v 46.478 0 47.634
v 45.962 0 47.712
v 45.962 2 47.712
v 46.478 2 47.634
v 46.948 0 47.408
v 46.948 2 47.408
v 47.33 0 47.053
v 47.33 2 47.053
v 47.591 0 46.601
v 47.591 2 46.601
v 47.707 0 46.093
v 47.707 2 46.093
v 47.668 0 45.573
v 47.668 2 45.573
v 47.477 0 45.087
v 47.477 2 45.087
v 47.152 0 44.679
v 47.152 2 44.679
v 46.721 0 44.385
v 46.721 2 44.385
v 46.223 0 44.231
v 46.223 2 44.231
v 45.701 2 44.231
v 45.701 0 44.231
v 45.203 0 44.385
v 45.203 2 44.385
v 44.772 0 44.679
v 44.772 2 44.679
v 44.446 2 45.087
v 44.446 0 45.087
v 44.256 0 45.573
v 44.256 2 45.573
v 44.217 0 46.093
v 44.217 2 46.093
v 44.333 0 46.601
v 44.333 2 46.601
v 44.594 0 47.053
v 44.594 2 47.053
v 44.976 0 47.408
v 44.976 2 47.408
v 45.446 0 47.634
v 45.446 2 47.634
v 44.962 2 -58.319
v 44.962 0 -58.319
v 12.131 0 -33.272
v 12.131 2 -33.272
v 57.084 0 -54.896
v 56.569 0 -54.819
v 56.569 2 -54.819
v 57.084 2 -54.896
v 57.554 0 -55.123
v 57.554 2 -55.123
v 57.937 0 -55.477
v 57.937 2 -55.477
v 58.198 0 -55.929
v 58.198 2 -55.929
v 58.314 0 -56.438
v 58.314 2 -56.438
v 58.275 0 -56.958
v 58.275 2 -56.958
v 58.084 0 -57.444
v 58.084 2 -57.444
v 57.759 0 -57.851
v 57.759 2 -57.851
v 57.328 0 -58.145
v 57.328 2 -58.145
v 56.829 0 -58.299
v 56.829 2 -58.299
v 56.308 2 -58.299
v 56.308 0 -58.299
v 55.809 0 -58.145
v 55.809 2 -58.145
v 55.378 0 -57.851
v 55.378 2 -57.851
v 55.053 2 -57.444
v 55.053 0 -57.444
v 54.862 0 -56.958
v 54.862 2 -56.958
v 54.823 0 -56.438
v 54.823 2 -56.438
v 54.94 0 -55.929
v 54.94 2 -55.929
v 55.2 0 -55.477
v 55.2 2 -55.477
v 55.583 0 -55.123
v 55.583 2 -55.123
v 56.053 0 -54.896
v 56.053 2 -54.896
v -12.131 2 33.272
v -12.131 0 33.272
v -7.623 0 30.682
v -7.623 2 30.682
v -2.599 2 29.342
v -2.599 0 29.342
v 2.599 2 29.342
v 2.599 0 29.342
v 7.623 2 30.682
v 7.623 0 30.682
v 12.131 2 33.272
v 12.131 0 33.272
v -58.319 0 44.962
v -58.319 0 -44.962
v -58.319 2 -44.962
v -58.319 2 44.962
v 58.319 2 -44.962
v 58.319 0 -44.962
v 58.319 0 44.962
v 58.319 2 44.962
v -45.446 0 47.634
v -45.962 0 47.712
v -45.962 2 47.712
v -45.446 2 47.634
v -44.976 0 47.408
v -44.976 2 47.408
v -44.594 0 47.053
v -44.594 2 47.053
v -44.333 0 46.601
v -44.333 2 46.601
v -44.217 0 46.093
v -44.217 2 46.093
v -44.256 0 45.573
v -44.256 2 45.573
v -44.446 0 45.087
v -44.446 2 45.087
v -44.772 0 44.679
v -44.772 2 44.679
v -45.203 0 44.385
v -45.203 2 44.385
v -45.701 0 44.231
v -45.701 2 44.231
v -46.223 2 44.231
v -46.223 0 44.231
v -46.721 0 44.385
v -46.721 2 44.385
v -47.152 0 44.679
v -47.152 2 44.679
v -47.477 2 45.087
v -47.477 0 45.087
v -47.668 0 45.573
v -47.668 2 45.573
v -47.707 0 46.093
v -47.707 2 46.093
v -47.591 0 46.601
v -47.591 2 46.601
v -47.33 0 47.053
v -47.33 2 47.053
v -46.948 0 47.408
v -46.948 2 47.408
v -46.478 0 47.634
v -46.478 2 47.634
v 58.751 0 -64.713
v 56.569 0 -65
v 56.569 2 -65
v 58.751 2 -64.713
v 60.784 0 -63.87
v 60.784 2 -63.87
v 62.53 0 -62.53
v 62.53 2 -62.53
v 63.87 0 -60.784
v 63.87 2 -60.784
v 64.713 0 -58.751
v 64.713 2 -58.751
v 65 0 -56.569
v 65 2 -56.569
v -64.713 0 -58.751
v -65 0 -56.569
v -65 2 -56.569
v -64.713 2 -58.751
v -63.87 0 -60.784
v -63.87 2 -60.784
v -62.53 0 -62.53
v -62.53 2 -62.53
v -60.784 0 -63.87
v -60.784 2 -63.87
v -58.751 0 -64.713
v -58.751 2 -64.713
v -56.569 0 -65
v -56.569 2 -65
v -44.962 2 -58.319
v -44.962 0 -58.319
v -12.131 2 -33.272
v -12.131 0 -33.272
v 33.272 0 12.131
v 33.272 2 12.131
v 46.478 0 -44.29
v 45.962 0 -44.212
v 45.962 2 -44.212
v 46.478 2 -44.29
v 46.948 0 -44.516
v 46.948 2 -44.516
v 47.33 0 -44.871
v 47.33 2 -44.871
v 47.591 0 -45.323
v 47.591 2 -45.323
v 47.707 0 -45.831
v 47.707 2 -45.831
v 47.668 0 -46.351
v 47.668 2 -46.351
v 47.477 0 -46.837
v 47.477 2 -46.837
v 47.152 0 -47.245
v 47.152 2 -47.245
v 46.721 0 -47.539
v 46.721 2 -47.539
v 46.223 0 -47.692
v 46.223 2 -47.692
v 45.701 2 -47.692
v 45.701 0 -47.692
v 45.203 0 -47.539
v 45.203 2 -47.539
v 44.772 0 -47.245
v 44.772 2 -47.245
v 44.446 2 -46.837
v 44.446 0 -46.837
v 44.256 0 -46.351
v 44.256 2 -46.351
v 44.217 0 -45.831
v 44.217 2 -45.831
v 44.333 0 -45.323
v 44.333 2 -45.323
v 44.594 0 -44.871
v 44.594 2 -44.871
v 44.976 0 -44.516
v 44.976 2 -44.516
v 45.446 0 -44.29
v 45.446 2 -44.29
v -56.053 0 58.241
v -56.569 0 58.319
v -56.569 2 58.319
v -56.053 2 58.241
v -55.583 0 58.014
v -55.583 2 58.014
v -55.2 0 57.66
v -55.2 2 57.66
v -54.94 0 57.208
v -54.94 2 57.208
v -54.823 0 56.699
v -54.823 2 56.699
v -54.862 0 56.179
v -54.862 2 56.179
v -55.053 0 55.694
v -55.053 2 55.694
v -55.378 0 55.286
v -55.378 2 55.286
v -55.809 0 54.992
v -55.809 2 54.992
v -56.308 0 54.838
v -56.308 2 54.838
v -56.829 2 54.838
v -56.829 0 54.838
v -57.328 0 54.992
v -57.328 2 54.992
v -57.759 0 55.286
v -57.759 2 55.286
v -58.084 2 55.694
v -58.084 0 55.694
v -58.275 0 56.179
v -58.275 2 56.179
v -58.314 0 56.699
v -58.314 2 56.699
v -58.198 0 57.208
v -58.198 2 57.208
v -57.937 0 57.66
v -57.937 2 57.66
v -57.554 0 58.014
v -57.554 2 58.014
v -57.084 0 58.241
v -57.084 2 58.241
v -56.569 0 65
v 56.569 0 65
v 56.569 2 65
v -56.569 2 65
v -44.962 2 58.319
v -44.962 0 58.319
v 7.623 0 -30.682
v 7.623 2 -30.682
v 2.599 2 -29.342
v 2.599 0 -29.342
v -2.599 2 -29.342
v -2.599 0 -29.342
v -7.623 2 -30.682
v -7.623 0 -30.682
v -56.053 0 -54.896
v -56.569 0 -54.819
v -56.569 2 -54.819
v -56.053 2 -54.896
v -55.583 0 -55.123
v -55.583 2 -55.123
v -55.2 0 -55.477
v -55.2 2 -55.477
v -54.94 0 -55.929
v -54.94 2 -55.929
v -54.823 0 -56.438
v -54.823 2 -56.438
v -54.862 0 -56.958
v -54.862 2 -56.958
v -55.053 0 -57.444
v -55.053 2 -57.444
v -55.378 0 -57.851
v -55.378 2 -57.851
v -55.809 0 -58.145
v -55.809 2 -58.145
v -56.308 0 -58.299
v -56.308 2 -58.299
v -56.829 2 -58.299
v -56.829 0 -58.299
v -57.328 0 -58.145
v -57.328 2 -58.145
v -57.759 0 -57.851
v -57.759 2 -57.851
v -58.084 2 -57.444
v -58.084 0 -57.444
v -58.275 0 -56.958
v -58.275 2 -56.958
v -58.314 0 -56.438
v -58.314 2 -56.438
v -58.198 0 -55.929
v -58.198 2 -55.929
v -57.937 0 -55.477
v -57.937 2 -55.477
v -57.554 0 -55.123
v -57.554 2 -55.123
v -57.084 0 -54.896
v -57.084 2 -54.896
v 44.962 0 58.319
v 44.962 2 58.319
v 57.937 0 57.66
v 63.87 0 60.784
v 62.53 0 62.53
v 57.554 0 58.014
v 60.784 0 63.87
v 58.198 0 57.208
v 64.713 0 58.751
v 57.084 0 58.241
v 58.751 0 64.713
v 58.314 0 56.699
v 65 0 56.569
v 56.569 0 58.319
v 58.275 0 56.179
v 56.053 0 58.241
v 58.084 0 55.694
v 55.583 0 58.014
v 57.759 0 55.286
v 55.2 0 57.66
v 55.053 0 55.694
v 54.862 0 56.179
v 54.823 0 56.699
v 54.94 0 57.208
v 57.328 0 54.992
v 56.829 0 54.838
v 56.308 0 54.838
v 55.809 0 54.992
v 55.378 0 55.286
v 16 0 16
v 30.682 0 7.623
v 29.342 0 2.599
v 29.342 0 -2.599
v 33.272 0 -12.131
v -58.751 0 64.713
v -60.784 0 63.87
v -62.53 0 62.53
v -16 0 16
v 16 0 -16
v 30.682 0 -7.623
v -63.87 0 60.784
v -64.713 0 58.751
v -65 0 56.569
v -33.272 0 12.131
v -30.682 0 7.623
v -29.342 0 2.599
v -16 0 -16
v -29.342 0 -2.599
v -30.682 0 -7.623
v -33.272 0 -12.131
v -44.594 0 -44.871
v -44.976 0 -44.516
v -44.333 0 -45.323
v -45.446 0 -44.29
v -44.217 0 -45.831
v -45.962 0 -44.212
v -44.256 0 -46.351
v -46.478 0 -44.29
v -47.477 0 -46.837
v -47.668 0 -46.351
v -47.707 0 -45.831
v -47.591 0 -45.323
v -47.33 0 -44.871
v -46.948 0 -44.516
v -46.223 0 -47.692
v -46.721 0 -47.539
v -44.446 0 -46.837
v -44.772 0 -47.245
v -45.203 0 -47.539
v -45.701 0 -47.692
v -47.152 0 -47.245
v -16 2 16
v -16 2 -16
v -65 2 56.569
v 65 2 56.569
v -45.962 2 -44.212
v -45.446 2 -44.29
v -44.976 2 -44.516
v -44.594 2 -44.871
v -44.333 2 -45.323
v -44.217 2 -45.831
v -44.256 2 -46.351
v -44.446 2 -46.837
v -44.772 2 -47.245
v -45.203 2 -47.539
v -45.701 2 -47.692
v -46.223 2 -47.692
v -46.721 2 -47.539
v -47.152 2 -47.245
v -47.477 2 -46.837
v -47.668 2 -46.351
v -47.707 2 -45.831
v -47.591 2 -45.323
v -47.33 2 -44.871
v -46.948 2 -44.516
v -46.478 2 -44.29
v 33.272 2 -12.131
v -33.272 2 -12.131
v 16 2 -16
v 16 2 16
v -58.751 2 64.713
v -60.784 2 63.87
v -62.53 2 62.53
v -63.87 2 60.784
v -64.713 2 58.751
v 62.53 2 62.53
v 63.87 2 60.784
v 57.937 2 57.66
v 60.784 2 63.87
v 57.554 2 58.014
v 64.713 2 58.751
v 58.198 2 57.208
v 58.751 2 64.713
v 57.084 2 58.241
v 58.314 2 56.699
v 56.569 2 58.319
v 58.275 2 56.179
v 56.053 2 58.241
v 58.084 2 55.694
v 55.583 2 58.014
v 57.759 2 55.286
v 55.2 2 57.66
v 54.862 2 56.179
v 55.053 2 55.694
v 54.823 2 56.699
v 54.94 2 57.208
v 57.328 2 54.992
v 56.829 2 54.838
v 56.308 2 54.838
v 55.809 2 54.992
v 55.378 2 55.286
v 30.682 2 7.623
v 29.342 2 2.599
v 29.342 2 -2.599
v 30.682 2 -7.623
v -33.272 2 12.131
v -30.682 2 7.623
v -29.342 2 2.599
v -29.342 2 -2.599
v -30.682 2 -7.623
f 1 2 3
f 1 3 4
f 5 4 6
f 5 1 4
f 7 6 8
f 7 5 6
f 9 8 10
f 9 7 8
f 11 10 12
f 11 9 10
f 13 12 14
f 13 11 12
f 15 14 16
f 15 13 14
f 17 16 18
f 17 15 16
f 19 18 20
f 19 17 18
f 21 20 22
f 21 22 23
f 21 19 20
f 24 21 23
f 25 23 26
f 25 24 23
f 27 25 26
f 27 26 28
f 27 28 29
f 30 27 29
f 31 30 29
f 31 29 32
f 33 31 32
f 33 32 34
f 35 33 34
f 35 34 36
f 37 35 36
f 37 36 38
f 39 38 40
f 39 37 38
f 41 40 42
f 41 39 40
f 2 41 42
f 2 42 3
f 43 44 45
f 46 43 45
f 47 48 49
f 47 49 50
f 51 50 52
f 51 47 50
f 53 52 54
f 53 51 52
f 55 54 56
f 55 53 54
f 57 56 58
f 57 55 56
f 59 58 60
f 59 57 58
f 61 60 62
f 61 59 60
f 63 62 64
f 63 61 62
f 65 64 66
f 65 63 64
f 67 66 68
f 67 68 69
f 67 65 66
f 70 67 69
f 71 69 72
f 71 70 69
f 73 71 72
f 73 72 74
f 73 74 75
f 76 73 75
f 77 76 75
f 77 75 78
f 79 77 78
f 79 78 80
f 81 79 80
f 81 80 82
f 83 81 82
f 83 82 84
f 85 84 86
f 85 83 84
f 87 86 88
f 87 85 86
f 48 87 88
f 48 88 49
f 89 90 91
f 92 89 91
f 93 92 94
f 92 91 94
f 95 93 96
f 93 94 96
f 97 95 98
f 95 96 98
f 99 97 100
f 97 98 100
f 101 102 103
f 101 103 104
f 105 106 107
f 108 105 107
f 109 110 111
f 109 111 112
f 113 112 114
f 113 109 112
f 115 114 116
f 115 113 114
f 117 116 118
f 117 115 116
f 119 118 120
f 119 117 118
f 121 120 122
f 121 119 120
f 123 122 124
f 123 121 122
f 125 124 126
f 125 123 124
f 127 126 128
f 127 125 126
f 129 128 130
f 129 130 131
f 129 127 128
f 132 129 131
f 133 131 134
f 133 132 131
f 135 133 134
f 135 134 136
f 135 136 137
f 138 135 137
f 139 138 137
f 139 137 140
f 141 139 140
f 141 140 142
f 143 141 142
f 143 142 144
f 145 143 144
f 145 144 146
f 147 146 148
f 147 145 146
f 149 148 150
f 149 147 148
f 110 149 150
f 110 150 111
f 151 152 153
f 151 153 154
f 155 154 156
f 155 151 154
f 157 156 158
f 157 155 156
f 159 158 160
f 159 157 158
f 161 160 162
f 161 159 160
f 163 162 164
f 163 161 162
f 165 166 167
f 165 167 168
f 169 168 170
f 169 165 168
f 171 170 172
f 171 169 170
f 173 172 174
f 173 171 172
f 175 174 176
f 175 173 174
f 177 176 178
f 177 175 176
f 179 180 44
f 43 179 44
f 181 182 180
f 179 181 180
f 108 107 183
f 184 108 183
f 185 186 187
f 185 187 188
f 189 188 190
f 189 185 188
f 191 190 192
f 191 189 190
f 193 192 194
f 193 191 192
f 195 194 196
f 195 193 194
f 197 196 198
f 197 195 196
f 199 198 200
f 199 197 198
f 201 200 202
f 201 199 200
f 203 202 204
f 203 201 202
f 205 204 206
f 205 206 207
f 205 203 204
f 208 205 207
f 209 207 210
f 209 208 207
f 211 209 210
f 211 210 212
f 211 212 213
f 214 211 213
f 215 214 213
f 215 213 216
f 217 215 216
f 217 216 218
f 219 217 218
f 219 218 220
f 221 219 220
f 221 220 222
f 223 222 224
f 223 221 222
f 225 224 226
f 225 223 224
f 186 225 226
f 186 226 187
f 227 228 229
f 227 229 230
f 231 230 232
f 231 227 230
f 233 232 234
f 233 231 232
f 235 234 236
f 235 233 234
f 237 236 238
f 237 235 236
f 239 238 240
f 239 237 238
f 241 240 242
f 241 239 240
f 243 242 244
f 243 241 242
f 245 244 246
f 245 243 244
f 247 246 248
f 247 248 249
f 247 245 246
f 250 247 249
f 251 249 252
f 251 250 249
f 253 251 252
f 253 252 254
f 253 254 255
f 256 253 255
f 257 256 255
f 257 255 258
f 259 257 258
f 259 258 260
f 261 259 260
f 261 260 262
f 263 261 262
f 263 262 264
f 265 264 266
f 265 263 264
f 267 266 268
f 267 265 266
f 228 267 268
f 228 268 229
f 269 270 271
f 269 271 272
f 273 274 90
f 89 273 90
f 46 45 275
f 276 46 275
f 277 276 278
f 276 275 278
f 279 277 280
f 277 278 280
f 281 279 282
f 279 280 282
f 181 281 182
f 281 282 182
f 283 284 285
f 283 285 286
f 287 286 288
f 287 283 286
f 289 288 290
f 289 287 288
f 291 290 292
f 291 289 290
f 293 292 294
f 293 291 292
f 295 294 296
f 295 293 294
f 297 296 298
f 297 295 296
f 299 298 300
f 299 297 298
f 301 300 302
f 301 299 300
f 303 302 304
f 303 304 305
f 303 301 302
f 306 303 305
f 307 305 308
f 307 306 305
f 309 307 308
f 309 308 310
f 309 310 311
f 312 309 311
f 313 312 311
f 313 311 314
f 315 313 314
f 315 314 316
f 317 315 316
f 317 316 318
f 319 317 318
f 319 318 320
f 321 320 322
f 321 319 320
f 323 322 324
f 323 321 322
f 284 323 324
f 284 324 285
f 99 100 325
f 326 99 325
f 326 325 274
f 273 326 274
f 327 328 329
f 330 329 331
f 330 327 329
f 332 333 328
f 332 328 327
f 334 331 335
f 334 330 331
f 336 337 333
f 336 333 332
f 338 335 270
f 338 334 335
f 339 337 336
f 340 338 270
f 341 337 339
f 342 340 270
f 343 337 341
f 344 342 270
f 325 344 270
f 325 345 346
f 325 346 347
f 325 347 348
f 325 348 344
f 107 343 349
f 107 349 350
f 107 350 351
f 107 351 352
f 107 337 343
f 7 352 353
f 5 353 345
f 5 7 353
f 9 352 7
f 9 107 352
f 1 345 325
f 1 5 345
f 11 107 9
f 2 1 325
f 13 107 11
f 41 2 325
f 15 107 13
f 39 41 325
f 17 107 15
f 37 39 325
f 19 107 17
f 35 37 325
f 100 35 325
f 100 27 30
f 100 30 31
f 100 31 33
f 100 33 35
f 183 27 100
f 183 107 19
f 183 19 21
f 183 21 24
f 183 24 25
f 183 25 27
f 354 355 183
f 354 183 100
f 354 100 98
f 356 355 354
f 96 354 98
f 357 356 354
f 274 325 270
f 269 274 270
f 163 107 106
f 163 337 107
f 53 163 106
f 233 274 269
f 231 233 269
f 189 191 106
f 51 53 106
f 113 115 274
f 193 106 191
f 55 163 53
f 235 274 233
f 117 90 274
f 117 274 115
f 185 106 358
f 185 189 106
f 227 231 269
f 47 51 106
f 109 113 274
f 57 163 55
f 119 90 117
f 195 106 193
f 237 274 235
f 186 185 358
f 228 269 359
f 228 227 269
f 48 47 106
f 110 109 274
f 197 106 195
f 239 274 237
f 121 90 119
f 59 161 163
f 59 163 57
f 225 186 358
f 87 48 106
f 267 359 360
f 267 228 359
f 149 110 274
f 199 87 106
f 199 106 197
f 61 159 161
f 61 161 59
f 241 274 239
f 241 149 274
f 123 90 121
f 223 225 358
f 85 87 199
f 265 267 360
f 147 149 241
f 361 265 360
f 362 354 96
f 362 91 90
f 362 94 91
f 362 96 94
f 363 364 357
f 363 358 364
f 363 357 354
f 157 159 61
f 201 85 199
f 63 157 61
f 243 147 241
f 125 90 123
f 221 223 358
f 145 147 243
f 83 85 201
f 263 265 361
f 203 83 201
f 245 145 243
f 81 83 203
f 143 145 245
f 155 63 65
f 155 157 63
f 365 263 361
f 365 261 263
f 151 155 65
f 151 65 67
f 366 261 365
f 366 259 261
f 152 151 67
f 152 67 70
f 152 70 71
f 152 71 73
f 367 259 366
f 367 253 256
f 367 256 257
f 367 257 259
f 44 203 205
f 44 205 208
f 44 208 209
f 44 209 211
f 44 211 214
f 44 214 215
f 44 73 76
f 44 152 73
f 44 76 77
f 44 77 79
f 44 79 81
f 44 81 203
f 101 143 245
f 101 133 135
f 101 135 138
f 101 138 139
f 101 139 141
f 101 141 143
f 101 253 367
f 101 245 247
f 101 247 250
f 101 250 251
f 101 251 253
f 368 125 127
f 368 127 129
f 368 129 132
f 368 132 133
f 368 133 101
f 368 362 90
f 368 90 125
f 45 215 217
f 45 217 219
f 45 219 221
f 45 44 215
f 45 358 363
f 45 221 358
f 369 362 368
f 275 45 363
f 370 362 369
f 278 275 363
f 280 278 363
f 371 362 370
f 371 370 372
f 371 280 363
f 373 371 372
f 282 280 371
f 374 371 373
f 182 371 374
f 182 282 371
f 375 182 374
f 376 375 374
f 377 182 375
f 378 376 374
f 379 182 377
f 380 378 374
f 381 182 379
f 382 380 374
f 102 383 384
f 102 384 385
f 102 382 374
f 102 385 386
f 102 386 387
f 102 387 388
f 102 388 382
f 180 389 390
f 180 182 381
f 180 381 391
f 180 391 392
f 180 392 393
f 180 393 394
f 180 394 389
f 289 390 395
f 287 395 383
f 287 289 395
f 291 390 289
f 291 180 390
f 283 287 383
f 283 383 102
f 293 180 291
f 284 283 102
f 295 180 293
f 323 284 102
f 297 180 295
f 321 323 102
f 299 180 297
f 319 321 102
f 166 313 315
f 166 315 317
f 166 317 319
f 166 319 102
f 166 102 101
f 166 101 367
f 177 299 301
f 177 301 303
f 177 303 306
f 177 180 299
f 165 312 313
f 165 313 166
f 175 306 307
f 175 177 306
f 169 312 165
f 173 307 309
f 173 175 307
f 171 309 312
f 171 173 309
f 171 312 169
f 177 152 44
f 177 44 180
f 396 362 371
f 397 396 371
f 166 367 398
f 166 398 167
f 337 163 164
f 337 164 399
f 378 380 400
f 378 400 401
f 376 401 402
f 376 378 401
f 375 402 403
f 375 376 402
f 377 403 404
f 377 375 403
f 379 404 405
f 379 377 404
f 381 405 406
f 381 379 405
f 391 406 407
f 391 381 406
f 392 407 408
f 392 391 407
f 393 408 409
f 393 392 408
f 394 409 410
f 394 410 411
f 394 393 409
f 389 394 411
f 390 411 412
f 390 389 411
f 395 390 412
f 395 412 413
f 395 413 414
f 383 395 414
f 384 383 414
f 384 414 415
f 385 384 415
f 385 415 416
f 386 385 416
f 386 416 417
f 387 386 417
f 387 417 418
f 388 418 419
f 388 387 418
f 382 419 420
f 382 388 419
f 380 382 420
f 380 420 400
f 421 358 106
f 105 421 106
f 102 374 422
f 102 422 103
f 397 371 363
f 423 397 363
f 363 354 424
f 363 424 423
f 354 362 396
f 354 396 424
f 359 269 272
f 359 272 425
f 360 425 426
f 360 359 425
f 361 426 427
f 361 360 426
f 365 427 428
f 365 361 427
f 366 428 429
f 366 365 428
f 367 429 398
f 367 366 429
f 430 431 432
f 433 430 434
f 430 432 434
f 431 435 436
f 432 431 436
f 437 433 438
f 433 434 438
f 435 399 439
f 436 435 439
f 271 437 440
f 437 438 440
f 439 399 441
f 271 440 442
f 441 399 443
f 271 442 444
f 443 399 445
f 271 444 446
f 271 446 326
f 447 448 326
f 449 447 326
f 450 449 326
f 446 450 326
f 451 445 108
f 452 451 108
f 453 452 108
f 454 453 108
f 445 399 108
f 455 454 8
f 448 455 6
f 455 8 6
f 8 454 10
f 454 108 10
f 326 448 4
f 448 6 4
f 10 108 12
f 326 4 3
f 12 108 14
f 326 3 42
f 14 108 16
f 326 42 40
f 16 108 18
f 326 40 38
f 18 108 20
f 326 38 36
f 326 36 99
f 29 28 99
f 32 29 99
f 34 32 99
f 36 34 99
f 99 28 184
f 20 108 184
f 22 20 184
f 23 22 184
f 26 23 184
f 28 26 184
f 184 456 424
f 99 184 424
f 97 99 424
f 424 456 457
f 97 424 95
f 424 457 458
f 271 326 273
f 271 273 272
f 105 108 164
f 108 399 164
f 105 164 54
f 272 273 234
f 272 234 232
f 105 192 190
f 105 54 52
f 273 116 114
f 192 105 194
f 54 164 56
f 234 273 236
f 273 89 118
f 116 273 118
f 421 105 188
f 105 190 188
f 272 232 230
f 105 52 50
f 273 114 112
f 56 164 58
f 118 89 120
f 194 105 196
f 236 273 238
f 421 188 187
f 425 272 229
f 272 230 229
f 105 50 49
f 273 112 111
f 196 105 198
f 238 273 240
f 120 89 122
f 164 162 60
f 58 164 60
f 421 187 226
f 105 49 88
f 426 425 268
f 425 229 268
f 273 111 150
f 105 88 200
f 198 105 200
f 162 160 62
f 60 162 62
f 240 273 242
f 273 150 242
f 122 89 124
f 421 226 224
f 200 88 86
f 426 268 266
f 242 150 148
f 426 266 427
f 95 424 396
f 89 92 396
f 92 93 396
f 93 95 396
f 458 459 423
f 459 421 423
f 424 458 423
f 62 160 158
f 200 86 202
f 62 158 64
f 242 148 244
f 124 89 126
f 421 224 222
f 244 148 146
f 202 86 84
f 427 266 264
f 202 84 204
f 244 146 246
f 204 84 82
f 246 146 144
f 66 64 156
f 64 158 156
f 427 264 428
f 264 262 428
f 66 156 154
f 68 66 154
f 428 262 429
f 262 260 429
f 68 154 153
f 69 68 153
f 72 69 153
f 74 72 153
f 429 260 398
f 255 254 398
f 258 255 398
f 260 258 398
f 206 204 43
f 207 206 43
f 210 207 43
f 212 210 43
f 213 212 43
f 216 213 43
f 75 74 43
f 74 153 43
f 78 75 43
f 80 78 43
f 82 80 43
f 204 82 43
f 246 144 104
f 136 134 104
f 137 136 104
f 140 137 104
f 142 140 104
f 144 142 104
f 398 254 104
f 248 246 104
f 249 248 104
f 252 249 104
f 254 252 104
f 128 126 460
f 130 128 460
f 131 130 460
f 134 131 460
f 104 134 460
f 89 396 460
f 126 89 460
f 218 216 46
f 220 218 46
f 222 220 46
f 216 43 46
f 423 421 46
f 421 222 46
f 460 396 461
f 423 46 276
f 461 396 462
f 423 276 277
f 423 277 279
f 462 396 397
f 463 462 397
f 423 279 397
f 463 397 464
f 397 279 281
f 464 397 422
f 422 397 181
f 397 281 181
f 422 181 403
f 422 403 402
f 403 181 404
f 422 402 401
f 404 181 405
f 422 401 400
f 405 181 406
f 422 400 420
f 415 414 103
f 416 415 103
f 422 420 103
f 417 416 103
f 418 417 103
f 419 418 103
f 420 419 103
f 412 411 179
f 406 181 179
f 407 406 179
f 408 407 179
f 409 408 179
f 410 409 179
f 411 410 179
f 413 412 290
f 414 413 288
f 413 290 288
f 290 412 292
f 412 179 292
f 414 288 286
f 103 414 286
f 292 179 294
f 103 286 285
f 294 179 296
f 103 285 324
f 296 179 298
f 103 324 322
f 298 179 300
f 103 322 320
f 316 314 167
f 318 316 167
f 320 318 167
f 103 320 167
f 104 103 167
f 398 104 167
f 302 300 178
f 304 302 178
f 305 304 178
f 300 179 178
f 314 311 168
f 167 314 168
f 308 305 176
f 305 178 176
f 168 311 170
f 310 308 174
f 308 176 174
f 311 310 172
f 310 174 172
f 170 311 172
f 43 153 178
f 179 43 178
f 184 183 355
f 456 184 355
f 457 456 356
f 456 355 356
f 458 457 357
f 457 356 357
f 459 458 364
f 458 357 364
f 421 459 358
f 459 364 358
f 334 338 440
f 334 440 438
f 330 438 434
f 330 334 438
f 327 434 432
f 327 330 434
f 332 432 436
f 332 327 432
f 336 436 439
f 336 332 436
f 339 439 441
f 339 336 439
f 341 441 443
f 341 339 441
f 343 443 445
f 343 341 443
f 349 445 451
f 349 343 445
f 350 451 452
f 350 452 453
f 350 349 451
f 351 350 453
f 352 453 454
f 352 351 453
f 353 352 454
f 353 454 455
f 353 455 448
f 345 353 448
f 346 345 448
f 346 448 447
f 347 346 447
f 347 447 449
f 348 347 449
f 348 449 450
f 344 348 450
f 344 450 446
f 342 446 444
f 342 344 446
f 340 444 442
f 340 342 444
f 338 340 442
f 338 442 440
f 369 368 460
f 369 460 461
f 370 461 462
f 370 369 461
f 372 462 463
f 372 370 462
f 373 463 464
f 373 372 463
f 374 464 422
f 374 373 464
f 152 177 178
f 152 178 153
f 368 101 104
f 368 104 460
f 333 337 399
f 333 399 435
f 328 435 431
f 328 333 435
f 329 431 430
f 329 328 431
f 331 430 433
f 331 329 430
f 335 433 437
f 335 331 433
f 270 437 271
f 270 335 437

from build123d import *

# Parameters (mm, degrees)
SKETCH_1_R      = 1.75
SKETCH_1_W      = 32
SKETCH_1_H      = 32
EXTRUDE_1_DEPTH = 2


with BuildPart() as part:
    # 草图1 → 凸台-拉伸1 (new body)
    with BuildSketch(Plane(origin=(0, 0, 0), x_dir=(1, 0, 0), z_dir=(0, 1, 0))):
        with BuildLine():
            Line((-56.568542495, 65), (56.568542495, 65))
            ThreePointArc((56.568542495, 65), (62.530483272, 62.530483272), (65, 56.568542495))
            Line((65, 56.568542495), (65, -56.568542495))
            ThreePointArc((65, -56.568542495), (62.530483272, -62.530483272), (56.568542495, -65))
            Line((56.568542495, -65), (-56.568542495, -65))
            ThreePointArc((-56.568542495, -65), (-62.530483272, -62.530483272), (-65, -56.568542495))
            Line((-65, -56.568542495), (-65, 56.568542495))
            ThreePointArc((-65, 56.568542495), (-62.530483272, 62.530483272), (-56.568542495, 65))
        make_face()
        with Locations(Location((-56.568542495, 56.568542495, 0), (0, 0, 270))):
            Circle(SKETCH_1_R, mode=Mode.SUBTRACT)
        with Locations(Location((56.568542495, 56.568542495, 0), (0, 0, 270))):
            Circle(SKETCH_1_R, mode=Mode.SUBTRACT)
        with Locations(Location((56.568542495, -56.568542495, 0), (0, 0, 270))):
            Circle(SKETCH_1_R, mode=Mode.SUBTRACT)
        with Locations(Location((-56.568542495, -56.568542495, 0), (0, 0, 270))):
            Circle(SKETCH_1_R, mode=Mode.SUBTRACT)
        with Locations(Location((45.961940777, 45.961940777, 0), (0, 0, 270))):
            Circle(SKETCH_1_R, mode=Mode.SUBTRACT)
        with Locations(Location((45.961940777, -45.961940777, 0), (0, 0, 270))):
            Circle(SKETCH_1_R, mode=Mode.SUBTRACT)
        with Locations(Location((-45.961940777, -45.961940777, 0), (0, 0, 270))):
            Circle(SKETCH_1_R, mode=Mode.SUBTRACT)
        with Locations(Location((-45.961940777, 45.961940777, 0), (0, 0, 270))):
            Circle(SKETCH_1_R, mode=Mode.SUBTRACT)
        with BuildLine():
            Line((-12.13091169, 33.271867745), (-44.961628787, 58.318542495))
            Line((-44.961628787, 58.318542495), (44.961628787, 58.318542495))
            Line((44.961628787, 58.318542495), (12.13091169, 33.271867745))
            ThreePointArc((12.13091169, 33.271867745), (0, 29.172841978), (-12.13091169, 33.271867745))
        make_face(mode=Mode.SUBTRACT)
        with BuildLine():
            Line((33.271867745, 12.13091169), (58.318542495, 44.961628787))
            Line((58.318542495, 44.961628787), (58.318542495, -44.961628787))
            Line((58.318542495, -44.961628787), (33.271867745, -12.13091169))
            ThreePointArc((33.271867745, -12.13091169), (29.172841978, 0), (33.271867745, 12.13091169))
        make_face(mode=Mode.SUBTRACT)
        with BuildLine():
            Line((-33.271867745, 12.13091169), (-58.318542495, 44.961628787))
            Line((-58.318542495, 44.961628787), (-58.318542495, -44.961628787))
            Line((-58.318542495, -44.961628787), (-33.271867745, -12.13091169))
            ThreePointArc((-33.271867745, -12.13091169), (-29.172841978, 0), (-33.271867745, 12.13091169))
        make_face(mode=Mode.SUBTRACT)
        with BuildLine():
            Line((12.13091169, -33.271867745), (44.961628787, -58.318542495))
            Line((44.961628787, -58.318542495), (-44.961628787, -58.318542495))
            Line((-44.961628787, -58.318542495), (-12.13091169, -33.271867745))
            ThreePointArc((-12.13091169, -33.271867745), (0, -29.172841978), (12.13091169, -33.271867745))
        make_face(mode=Mode.SUBTRACT)
        Rectangle(SKETCH_1_W, SKETCH_1_H, mode=Mode.SUBTRACT)
    extrude(amount=EXTRUDE_1_DEPTH)


solid = part.part
